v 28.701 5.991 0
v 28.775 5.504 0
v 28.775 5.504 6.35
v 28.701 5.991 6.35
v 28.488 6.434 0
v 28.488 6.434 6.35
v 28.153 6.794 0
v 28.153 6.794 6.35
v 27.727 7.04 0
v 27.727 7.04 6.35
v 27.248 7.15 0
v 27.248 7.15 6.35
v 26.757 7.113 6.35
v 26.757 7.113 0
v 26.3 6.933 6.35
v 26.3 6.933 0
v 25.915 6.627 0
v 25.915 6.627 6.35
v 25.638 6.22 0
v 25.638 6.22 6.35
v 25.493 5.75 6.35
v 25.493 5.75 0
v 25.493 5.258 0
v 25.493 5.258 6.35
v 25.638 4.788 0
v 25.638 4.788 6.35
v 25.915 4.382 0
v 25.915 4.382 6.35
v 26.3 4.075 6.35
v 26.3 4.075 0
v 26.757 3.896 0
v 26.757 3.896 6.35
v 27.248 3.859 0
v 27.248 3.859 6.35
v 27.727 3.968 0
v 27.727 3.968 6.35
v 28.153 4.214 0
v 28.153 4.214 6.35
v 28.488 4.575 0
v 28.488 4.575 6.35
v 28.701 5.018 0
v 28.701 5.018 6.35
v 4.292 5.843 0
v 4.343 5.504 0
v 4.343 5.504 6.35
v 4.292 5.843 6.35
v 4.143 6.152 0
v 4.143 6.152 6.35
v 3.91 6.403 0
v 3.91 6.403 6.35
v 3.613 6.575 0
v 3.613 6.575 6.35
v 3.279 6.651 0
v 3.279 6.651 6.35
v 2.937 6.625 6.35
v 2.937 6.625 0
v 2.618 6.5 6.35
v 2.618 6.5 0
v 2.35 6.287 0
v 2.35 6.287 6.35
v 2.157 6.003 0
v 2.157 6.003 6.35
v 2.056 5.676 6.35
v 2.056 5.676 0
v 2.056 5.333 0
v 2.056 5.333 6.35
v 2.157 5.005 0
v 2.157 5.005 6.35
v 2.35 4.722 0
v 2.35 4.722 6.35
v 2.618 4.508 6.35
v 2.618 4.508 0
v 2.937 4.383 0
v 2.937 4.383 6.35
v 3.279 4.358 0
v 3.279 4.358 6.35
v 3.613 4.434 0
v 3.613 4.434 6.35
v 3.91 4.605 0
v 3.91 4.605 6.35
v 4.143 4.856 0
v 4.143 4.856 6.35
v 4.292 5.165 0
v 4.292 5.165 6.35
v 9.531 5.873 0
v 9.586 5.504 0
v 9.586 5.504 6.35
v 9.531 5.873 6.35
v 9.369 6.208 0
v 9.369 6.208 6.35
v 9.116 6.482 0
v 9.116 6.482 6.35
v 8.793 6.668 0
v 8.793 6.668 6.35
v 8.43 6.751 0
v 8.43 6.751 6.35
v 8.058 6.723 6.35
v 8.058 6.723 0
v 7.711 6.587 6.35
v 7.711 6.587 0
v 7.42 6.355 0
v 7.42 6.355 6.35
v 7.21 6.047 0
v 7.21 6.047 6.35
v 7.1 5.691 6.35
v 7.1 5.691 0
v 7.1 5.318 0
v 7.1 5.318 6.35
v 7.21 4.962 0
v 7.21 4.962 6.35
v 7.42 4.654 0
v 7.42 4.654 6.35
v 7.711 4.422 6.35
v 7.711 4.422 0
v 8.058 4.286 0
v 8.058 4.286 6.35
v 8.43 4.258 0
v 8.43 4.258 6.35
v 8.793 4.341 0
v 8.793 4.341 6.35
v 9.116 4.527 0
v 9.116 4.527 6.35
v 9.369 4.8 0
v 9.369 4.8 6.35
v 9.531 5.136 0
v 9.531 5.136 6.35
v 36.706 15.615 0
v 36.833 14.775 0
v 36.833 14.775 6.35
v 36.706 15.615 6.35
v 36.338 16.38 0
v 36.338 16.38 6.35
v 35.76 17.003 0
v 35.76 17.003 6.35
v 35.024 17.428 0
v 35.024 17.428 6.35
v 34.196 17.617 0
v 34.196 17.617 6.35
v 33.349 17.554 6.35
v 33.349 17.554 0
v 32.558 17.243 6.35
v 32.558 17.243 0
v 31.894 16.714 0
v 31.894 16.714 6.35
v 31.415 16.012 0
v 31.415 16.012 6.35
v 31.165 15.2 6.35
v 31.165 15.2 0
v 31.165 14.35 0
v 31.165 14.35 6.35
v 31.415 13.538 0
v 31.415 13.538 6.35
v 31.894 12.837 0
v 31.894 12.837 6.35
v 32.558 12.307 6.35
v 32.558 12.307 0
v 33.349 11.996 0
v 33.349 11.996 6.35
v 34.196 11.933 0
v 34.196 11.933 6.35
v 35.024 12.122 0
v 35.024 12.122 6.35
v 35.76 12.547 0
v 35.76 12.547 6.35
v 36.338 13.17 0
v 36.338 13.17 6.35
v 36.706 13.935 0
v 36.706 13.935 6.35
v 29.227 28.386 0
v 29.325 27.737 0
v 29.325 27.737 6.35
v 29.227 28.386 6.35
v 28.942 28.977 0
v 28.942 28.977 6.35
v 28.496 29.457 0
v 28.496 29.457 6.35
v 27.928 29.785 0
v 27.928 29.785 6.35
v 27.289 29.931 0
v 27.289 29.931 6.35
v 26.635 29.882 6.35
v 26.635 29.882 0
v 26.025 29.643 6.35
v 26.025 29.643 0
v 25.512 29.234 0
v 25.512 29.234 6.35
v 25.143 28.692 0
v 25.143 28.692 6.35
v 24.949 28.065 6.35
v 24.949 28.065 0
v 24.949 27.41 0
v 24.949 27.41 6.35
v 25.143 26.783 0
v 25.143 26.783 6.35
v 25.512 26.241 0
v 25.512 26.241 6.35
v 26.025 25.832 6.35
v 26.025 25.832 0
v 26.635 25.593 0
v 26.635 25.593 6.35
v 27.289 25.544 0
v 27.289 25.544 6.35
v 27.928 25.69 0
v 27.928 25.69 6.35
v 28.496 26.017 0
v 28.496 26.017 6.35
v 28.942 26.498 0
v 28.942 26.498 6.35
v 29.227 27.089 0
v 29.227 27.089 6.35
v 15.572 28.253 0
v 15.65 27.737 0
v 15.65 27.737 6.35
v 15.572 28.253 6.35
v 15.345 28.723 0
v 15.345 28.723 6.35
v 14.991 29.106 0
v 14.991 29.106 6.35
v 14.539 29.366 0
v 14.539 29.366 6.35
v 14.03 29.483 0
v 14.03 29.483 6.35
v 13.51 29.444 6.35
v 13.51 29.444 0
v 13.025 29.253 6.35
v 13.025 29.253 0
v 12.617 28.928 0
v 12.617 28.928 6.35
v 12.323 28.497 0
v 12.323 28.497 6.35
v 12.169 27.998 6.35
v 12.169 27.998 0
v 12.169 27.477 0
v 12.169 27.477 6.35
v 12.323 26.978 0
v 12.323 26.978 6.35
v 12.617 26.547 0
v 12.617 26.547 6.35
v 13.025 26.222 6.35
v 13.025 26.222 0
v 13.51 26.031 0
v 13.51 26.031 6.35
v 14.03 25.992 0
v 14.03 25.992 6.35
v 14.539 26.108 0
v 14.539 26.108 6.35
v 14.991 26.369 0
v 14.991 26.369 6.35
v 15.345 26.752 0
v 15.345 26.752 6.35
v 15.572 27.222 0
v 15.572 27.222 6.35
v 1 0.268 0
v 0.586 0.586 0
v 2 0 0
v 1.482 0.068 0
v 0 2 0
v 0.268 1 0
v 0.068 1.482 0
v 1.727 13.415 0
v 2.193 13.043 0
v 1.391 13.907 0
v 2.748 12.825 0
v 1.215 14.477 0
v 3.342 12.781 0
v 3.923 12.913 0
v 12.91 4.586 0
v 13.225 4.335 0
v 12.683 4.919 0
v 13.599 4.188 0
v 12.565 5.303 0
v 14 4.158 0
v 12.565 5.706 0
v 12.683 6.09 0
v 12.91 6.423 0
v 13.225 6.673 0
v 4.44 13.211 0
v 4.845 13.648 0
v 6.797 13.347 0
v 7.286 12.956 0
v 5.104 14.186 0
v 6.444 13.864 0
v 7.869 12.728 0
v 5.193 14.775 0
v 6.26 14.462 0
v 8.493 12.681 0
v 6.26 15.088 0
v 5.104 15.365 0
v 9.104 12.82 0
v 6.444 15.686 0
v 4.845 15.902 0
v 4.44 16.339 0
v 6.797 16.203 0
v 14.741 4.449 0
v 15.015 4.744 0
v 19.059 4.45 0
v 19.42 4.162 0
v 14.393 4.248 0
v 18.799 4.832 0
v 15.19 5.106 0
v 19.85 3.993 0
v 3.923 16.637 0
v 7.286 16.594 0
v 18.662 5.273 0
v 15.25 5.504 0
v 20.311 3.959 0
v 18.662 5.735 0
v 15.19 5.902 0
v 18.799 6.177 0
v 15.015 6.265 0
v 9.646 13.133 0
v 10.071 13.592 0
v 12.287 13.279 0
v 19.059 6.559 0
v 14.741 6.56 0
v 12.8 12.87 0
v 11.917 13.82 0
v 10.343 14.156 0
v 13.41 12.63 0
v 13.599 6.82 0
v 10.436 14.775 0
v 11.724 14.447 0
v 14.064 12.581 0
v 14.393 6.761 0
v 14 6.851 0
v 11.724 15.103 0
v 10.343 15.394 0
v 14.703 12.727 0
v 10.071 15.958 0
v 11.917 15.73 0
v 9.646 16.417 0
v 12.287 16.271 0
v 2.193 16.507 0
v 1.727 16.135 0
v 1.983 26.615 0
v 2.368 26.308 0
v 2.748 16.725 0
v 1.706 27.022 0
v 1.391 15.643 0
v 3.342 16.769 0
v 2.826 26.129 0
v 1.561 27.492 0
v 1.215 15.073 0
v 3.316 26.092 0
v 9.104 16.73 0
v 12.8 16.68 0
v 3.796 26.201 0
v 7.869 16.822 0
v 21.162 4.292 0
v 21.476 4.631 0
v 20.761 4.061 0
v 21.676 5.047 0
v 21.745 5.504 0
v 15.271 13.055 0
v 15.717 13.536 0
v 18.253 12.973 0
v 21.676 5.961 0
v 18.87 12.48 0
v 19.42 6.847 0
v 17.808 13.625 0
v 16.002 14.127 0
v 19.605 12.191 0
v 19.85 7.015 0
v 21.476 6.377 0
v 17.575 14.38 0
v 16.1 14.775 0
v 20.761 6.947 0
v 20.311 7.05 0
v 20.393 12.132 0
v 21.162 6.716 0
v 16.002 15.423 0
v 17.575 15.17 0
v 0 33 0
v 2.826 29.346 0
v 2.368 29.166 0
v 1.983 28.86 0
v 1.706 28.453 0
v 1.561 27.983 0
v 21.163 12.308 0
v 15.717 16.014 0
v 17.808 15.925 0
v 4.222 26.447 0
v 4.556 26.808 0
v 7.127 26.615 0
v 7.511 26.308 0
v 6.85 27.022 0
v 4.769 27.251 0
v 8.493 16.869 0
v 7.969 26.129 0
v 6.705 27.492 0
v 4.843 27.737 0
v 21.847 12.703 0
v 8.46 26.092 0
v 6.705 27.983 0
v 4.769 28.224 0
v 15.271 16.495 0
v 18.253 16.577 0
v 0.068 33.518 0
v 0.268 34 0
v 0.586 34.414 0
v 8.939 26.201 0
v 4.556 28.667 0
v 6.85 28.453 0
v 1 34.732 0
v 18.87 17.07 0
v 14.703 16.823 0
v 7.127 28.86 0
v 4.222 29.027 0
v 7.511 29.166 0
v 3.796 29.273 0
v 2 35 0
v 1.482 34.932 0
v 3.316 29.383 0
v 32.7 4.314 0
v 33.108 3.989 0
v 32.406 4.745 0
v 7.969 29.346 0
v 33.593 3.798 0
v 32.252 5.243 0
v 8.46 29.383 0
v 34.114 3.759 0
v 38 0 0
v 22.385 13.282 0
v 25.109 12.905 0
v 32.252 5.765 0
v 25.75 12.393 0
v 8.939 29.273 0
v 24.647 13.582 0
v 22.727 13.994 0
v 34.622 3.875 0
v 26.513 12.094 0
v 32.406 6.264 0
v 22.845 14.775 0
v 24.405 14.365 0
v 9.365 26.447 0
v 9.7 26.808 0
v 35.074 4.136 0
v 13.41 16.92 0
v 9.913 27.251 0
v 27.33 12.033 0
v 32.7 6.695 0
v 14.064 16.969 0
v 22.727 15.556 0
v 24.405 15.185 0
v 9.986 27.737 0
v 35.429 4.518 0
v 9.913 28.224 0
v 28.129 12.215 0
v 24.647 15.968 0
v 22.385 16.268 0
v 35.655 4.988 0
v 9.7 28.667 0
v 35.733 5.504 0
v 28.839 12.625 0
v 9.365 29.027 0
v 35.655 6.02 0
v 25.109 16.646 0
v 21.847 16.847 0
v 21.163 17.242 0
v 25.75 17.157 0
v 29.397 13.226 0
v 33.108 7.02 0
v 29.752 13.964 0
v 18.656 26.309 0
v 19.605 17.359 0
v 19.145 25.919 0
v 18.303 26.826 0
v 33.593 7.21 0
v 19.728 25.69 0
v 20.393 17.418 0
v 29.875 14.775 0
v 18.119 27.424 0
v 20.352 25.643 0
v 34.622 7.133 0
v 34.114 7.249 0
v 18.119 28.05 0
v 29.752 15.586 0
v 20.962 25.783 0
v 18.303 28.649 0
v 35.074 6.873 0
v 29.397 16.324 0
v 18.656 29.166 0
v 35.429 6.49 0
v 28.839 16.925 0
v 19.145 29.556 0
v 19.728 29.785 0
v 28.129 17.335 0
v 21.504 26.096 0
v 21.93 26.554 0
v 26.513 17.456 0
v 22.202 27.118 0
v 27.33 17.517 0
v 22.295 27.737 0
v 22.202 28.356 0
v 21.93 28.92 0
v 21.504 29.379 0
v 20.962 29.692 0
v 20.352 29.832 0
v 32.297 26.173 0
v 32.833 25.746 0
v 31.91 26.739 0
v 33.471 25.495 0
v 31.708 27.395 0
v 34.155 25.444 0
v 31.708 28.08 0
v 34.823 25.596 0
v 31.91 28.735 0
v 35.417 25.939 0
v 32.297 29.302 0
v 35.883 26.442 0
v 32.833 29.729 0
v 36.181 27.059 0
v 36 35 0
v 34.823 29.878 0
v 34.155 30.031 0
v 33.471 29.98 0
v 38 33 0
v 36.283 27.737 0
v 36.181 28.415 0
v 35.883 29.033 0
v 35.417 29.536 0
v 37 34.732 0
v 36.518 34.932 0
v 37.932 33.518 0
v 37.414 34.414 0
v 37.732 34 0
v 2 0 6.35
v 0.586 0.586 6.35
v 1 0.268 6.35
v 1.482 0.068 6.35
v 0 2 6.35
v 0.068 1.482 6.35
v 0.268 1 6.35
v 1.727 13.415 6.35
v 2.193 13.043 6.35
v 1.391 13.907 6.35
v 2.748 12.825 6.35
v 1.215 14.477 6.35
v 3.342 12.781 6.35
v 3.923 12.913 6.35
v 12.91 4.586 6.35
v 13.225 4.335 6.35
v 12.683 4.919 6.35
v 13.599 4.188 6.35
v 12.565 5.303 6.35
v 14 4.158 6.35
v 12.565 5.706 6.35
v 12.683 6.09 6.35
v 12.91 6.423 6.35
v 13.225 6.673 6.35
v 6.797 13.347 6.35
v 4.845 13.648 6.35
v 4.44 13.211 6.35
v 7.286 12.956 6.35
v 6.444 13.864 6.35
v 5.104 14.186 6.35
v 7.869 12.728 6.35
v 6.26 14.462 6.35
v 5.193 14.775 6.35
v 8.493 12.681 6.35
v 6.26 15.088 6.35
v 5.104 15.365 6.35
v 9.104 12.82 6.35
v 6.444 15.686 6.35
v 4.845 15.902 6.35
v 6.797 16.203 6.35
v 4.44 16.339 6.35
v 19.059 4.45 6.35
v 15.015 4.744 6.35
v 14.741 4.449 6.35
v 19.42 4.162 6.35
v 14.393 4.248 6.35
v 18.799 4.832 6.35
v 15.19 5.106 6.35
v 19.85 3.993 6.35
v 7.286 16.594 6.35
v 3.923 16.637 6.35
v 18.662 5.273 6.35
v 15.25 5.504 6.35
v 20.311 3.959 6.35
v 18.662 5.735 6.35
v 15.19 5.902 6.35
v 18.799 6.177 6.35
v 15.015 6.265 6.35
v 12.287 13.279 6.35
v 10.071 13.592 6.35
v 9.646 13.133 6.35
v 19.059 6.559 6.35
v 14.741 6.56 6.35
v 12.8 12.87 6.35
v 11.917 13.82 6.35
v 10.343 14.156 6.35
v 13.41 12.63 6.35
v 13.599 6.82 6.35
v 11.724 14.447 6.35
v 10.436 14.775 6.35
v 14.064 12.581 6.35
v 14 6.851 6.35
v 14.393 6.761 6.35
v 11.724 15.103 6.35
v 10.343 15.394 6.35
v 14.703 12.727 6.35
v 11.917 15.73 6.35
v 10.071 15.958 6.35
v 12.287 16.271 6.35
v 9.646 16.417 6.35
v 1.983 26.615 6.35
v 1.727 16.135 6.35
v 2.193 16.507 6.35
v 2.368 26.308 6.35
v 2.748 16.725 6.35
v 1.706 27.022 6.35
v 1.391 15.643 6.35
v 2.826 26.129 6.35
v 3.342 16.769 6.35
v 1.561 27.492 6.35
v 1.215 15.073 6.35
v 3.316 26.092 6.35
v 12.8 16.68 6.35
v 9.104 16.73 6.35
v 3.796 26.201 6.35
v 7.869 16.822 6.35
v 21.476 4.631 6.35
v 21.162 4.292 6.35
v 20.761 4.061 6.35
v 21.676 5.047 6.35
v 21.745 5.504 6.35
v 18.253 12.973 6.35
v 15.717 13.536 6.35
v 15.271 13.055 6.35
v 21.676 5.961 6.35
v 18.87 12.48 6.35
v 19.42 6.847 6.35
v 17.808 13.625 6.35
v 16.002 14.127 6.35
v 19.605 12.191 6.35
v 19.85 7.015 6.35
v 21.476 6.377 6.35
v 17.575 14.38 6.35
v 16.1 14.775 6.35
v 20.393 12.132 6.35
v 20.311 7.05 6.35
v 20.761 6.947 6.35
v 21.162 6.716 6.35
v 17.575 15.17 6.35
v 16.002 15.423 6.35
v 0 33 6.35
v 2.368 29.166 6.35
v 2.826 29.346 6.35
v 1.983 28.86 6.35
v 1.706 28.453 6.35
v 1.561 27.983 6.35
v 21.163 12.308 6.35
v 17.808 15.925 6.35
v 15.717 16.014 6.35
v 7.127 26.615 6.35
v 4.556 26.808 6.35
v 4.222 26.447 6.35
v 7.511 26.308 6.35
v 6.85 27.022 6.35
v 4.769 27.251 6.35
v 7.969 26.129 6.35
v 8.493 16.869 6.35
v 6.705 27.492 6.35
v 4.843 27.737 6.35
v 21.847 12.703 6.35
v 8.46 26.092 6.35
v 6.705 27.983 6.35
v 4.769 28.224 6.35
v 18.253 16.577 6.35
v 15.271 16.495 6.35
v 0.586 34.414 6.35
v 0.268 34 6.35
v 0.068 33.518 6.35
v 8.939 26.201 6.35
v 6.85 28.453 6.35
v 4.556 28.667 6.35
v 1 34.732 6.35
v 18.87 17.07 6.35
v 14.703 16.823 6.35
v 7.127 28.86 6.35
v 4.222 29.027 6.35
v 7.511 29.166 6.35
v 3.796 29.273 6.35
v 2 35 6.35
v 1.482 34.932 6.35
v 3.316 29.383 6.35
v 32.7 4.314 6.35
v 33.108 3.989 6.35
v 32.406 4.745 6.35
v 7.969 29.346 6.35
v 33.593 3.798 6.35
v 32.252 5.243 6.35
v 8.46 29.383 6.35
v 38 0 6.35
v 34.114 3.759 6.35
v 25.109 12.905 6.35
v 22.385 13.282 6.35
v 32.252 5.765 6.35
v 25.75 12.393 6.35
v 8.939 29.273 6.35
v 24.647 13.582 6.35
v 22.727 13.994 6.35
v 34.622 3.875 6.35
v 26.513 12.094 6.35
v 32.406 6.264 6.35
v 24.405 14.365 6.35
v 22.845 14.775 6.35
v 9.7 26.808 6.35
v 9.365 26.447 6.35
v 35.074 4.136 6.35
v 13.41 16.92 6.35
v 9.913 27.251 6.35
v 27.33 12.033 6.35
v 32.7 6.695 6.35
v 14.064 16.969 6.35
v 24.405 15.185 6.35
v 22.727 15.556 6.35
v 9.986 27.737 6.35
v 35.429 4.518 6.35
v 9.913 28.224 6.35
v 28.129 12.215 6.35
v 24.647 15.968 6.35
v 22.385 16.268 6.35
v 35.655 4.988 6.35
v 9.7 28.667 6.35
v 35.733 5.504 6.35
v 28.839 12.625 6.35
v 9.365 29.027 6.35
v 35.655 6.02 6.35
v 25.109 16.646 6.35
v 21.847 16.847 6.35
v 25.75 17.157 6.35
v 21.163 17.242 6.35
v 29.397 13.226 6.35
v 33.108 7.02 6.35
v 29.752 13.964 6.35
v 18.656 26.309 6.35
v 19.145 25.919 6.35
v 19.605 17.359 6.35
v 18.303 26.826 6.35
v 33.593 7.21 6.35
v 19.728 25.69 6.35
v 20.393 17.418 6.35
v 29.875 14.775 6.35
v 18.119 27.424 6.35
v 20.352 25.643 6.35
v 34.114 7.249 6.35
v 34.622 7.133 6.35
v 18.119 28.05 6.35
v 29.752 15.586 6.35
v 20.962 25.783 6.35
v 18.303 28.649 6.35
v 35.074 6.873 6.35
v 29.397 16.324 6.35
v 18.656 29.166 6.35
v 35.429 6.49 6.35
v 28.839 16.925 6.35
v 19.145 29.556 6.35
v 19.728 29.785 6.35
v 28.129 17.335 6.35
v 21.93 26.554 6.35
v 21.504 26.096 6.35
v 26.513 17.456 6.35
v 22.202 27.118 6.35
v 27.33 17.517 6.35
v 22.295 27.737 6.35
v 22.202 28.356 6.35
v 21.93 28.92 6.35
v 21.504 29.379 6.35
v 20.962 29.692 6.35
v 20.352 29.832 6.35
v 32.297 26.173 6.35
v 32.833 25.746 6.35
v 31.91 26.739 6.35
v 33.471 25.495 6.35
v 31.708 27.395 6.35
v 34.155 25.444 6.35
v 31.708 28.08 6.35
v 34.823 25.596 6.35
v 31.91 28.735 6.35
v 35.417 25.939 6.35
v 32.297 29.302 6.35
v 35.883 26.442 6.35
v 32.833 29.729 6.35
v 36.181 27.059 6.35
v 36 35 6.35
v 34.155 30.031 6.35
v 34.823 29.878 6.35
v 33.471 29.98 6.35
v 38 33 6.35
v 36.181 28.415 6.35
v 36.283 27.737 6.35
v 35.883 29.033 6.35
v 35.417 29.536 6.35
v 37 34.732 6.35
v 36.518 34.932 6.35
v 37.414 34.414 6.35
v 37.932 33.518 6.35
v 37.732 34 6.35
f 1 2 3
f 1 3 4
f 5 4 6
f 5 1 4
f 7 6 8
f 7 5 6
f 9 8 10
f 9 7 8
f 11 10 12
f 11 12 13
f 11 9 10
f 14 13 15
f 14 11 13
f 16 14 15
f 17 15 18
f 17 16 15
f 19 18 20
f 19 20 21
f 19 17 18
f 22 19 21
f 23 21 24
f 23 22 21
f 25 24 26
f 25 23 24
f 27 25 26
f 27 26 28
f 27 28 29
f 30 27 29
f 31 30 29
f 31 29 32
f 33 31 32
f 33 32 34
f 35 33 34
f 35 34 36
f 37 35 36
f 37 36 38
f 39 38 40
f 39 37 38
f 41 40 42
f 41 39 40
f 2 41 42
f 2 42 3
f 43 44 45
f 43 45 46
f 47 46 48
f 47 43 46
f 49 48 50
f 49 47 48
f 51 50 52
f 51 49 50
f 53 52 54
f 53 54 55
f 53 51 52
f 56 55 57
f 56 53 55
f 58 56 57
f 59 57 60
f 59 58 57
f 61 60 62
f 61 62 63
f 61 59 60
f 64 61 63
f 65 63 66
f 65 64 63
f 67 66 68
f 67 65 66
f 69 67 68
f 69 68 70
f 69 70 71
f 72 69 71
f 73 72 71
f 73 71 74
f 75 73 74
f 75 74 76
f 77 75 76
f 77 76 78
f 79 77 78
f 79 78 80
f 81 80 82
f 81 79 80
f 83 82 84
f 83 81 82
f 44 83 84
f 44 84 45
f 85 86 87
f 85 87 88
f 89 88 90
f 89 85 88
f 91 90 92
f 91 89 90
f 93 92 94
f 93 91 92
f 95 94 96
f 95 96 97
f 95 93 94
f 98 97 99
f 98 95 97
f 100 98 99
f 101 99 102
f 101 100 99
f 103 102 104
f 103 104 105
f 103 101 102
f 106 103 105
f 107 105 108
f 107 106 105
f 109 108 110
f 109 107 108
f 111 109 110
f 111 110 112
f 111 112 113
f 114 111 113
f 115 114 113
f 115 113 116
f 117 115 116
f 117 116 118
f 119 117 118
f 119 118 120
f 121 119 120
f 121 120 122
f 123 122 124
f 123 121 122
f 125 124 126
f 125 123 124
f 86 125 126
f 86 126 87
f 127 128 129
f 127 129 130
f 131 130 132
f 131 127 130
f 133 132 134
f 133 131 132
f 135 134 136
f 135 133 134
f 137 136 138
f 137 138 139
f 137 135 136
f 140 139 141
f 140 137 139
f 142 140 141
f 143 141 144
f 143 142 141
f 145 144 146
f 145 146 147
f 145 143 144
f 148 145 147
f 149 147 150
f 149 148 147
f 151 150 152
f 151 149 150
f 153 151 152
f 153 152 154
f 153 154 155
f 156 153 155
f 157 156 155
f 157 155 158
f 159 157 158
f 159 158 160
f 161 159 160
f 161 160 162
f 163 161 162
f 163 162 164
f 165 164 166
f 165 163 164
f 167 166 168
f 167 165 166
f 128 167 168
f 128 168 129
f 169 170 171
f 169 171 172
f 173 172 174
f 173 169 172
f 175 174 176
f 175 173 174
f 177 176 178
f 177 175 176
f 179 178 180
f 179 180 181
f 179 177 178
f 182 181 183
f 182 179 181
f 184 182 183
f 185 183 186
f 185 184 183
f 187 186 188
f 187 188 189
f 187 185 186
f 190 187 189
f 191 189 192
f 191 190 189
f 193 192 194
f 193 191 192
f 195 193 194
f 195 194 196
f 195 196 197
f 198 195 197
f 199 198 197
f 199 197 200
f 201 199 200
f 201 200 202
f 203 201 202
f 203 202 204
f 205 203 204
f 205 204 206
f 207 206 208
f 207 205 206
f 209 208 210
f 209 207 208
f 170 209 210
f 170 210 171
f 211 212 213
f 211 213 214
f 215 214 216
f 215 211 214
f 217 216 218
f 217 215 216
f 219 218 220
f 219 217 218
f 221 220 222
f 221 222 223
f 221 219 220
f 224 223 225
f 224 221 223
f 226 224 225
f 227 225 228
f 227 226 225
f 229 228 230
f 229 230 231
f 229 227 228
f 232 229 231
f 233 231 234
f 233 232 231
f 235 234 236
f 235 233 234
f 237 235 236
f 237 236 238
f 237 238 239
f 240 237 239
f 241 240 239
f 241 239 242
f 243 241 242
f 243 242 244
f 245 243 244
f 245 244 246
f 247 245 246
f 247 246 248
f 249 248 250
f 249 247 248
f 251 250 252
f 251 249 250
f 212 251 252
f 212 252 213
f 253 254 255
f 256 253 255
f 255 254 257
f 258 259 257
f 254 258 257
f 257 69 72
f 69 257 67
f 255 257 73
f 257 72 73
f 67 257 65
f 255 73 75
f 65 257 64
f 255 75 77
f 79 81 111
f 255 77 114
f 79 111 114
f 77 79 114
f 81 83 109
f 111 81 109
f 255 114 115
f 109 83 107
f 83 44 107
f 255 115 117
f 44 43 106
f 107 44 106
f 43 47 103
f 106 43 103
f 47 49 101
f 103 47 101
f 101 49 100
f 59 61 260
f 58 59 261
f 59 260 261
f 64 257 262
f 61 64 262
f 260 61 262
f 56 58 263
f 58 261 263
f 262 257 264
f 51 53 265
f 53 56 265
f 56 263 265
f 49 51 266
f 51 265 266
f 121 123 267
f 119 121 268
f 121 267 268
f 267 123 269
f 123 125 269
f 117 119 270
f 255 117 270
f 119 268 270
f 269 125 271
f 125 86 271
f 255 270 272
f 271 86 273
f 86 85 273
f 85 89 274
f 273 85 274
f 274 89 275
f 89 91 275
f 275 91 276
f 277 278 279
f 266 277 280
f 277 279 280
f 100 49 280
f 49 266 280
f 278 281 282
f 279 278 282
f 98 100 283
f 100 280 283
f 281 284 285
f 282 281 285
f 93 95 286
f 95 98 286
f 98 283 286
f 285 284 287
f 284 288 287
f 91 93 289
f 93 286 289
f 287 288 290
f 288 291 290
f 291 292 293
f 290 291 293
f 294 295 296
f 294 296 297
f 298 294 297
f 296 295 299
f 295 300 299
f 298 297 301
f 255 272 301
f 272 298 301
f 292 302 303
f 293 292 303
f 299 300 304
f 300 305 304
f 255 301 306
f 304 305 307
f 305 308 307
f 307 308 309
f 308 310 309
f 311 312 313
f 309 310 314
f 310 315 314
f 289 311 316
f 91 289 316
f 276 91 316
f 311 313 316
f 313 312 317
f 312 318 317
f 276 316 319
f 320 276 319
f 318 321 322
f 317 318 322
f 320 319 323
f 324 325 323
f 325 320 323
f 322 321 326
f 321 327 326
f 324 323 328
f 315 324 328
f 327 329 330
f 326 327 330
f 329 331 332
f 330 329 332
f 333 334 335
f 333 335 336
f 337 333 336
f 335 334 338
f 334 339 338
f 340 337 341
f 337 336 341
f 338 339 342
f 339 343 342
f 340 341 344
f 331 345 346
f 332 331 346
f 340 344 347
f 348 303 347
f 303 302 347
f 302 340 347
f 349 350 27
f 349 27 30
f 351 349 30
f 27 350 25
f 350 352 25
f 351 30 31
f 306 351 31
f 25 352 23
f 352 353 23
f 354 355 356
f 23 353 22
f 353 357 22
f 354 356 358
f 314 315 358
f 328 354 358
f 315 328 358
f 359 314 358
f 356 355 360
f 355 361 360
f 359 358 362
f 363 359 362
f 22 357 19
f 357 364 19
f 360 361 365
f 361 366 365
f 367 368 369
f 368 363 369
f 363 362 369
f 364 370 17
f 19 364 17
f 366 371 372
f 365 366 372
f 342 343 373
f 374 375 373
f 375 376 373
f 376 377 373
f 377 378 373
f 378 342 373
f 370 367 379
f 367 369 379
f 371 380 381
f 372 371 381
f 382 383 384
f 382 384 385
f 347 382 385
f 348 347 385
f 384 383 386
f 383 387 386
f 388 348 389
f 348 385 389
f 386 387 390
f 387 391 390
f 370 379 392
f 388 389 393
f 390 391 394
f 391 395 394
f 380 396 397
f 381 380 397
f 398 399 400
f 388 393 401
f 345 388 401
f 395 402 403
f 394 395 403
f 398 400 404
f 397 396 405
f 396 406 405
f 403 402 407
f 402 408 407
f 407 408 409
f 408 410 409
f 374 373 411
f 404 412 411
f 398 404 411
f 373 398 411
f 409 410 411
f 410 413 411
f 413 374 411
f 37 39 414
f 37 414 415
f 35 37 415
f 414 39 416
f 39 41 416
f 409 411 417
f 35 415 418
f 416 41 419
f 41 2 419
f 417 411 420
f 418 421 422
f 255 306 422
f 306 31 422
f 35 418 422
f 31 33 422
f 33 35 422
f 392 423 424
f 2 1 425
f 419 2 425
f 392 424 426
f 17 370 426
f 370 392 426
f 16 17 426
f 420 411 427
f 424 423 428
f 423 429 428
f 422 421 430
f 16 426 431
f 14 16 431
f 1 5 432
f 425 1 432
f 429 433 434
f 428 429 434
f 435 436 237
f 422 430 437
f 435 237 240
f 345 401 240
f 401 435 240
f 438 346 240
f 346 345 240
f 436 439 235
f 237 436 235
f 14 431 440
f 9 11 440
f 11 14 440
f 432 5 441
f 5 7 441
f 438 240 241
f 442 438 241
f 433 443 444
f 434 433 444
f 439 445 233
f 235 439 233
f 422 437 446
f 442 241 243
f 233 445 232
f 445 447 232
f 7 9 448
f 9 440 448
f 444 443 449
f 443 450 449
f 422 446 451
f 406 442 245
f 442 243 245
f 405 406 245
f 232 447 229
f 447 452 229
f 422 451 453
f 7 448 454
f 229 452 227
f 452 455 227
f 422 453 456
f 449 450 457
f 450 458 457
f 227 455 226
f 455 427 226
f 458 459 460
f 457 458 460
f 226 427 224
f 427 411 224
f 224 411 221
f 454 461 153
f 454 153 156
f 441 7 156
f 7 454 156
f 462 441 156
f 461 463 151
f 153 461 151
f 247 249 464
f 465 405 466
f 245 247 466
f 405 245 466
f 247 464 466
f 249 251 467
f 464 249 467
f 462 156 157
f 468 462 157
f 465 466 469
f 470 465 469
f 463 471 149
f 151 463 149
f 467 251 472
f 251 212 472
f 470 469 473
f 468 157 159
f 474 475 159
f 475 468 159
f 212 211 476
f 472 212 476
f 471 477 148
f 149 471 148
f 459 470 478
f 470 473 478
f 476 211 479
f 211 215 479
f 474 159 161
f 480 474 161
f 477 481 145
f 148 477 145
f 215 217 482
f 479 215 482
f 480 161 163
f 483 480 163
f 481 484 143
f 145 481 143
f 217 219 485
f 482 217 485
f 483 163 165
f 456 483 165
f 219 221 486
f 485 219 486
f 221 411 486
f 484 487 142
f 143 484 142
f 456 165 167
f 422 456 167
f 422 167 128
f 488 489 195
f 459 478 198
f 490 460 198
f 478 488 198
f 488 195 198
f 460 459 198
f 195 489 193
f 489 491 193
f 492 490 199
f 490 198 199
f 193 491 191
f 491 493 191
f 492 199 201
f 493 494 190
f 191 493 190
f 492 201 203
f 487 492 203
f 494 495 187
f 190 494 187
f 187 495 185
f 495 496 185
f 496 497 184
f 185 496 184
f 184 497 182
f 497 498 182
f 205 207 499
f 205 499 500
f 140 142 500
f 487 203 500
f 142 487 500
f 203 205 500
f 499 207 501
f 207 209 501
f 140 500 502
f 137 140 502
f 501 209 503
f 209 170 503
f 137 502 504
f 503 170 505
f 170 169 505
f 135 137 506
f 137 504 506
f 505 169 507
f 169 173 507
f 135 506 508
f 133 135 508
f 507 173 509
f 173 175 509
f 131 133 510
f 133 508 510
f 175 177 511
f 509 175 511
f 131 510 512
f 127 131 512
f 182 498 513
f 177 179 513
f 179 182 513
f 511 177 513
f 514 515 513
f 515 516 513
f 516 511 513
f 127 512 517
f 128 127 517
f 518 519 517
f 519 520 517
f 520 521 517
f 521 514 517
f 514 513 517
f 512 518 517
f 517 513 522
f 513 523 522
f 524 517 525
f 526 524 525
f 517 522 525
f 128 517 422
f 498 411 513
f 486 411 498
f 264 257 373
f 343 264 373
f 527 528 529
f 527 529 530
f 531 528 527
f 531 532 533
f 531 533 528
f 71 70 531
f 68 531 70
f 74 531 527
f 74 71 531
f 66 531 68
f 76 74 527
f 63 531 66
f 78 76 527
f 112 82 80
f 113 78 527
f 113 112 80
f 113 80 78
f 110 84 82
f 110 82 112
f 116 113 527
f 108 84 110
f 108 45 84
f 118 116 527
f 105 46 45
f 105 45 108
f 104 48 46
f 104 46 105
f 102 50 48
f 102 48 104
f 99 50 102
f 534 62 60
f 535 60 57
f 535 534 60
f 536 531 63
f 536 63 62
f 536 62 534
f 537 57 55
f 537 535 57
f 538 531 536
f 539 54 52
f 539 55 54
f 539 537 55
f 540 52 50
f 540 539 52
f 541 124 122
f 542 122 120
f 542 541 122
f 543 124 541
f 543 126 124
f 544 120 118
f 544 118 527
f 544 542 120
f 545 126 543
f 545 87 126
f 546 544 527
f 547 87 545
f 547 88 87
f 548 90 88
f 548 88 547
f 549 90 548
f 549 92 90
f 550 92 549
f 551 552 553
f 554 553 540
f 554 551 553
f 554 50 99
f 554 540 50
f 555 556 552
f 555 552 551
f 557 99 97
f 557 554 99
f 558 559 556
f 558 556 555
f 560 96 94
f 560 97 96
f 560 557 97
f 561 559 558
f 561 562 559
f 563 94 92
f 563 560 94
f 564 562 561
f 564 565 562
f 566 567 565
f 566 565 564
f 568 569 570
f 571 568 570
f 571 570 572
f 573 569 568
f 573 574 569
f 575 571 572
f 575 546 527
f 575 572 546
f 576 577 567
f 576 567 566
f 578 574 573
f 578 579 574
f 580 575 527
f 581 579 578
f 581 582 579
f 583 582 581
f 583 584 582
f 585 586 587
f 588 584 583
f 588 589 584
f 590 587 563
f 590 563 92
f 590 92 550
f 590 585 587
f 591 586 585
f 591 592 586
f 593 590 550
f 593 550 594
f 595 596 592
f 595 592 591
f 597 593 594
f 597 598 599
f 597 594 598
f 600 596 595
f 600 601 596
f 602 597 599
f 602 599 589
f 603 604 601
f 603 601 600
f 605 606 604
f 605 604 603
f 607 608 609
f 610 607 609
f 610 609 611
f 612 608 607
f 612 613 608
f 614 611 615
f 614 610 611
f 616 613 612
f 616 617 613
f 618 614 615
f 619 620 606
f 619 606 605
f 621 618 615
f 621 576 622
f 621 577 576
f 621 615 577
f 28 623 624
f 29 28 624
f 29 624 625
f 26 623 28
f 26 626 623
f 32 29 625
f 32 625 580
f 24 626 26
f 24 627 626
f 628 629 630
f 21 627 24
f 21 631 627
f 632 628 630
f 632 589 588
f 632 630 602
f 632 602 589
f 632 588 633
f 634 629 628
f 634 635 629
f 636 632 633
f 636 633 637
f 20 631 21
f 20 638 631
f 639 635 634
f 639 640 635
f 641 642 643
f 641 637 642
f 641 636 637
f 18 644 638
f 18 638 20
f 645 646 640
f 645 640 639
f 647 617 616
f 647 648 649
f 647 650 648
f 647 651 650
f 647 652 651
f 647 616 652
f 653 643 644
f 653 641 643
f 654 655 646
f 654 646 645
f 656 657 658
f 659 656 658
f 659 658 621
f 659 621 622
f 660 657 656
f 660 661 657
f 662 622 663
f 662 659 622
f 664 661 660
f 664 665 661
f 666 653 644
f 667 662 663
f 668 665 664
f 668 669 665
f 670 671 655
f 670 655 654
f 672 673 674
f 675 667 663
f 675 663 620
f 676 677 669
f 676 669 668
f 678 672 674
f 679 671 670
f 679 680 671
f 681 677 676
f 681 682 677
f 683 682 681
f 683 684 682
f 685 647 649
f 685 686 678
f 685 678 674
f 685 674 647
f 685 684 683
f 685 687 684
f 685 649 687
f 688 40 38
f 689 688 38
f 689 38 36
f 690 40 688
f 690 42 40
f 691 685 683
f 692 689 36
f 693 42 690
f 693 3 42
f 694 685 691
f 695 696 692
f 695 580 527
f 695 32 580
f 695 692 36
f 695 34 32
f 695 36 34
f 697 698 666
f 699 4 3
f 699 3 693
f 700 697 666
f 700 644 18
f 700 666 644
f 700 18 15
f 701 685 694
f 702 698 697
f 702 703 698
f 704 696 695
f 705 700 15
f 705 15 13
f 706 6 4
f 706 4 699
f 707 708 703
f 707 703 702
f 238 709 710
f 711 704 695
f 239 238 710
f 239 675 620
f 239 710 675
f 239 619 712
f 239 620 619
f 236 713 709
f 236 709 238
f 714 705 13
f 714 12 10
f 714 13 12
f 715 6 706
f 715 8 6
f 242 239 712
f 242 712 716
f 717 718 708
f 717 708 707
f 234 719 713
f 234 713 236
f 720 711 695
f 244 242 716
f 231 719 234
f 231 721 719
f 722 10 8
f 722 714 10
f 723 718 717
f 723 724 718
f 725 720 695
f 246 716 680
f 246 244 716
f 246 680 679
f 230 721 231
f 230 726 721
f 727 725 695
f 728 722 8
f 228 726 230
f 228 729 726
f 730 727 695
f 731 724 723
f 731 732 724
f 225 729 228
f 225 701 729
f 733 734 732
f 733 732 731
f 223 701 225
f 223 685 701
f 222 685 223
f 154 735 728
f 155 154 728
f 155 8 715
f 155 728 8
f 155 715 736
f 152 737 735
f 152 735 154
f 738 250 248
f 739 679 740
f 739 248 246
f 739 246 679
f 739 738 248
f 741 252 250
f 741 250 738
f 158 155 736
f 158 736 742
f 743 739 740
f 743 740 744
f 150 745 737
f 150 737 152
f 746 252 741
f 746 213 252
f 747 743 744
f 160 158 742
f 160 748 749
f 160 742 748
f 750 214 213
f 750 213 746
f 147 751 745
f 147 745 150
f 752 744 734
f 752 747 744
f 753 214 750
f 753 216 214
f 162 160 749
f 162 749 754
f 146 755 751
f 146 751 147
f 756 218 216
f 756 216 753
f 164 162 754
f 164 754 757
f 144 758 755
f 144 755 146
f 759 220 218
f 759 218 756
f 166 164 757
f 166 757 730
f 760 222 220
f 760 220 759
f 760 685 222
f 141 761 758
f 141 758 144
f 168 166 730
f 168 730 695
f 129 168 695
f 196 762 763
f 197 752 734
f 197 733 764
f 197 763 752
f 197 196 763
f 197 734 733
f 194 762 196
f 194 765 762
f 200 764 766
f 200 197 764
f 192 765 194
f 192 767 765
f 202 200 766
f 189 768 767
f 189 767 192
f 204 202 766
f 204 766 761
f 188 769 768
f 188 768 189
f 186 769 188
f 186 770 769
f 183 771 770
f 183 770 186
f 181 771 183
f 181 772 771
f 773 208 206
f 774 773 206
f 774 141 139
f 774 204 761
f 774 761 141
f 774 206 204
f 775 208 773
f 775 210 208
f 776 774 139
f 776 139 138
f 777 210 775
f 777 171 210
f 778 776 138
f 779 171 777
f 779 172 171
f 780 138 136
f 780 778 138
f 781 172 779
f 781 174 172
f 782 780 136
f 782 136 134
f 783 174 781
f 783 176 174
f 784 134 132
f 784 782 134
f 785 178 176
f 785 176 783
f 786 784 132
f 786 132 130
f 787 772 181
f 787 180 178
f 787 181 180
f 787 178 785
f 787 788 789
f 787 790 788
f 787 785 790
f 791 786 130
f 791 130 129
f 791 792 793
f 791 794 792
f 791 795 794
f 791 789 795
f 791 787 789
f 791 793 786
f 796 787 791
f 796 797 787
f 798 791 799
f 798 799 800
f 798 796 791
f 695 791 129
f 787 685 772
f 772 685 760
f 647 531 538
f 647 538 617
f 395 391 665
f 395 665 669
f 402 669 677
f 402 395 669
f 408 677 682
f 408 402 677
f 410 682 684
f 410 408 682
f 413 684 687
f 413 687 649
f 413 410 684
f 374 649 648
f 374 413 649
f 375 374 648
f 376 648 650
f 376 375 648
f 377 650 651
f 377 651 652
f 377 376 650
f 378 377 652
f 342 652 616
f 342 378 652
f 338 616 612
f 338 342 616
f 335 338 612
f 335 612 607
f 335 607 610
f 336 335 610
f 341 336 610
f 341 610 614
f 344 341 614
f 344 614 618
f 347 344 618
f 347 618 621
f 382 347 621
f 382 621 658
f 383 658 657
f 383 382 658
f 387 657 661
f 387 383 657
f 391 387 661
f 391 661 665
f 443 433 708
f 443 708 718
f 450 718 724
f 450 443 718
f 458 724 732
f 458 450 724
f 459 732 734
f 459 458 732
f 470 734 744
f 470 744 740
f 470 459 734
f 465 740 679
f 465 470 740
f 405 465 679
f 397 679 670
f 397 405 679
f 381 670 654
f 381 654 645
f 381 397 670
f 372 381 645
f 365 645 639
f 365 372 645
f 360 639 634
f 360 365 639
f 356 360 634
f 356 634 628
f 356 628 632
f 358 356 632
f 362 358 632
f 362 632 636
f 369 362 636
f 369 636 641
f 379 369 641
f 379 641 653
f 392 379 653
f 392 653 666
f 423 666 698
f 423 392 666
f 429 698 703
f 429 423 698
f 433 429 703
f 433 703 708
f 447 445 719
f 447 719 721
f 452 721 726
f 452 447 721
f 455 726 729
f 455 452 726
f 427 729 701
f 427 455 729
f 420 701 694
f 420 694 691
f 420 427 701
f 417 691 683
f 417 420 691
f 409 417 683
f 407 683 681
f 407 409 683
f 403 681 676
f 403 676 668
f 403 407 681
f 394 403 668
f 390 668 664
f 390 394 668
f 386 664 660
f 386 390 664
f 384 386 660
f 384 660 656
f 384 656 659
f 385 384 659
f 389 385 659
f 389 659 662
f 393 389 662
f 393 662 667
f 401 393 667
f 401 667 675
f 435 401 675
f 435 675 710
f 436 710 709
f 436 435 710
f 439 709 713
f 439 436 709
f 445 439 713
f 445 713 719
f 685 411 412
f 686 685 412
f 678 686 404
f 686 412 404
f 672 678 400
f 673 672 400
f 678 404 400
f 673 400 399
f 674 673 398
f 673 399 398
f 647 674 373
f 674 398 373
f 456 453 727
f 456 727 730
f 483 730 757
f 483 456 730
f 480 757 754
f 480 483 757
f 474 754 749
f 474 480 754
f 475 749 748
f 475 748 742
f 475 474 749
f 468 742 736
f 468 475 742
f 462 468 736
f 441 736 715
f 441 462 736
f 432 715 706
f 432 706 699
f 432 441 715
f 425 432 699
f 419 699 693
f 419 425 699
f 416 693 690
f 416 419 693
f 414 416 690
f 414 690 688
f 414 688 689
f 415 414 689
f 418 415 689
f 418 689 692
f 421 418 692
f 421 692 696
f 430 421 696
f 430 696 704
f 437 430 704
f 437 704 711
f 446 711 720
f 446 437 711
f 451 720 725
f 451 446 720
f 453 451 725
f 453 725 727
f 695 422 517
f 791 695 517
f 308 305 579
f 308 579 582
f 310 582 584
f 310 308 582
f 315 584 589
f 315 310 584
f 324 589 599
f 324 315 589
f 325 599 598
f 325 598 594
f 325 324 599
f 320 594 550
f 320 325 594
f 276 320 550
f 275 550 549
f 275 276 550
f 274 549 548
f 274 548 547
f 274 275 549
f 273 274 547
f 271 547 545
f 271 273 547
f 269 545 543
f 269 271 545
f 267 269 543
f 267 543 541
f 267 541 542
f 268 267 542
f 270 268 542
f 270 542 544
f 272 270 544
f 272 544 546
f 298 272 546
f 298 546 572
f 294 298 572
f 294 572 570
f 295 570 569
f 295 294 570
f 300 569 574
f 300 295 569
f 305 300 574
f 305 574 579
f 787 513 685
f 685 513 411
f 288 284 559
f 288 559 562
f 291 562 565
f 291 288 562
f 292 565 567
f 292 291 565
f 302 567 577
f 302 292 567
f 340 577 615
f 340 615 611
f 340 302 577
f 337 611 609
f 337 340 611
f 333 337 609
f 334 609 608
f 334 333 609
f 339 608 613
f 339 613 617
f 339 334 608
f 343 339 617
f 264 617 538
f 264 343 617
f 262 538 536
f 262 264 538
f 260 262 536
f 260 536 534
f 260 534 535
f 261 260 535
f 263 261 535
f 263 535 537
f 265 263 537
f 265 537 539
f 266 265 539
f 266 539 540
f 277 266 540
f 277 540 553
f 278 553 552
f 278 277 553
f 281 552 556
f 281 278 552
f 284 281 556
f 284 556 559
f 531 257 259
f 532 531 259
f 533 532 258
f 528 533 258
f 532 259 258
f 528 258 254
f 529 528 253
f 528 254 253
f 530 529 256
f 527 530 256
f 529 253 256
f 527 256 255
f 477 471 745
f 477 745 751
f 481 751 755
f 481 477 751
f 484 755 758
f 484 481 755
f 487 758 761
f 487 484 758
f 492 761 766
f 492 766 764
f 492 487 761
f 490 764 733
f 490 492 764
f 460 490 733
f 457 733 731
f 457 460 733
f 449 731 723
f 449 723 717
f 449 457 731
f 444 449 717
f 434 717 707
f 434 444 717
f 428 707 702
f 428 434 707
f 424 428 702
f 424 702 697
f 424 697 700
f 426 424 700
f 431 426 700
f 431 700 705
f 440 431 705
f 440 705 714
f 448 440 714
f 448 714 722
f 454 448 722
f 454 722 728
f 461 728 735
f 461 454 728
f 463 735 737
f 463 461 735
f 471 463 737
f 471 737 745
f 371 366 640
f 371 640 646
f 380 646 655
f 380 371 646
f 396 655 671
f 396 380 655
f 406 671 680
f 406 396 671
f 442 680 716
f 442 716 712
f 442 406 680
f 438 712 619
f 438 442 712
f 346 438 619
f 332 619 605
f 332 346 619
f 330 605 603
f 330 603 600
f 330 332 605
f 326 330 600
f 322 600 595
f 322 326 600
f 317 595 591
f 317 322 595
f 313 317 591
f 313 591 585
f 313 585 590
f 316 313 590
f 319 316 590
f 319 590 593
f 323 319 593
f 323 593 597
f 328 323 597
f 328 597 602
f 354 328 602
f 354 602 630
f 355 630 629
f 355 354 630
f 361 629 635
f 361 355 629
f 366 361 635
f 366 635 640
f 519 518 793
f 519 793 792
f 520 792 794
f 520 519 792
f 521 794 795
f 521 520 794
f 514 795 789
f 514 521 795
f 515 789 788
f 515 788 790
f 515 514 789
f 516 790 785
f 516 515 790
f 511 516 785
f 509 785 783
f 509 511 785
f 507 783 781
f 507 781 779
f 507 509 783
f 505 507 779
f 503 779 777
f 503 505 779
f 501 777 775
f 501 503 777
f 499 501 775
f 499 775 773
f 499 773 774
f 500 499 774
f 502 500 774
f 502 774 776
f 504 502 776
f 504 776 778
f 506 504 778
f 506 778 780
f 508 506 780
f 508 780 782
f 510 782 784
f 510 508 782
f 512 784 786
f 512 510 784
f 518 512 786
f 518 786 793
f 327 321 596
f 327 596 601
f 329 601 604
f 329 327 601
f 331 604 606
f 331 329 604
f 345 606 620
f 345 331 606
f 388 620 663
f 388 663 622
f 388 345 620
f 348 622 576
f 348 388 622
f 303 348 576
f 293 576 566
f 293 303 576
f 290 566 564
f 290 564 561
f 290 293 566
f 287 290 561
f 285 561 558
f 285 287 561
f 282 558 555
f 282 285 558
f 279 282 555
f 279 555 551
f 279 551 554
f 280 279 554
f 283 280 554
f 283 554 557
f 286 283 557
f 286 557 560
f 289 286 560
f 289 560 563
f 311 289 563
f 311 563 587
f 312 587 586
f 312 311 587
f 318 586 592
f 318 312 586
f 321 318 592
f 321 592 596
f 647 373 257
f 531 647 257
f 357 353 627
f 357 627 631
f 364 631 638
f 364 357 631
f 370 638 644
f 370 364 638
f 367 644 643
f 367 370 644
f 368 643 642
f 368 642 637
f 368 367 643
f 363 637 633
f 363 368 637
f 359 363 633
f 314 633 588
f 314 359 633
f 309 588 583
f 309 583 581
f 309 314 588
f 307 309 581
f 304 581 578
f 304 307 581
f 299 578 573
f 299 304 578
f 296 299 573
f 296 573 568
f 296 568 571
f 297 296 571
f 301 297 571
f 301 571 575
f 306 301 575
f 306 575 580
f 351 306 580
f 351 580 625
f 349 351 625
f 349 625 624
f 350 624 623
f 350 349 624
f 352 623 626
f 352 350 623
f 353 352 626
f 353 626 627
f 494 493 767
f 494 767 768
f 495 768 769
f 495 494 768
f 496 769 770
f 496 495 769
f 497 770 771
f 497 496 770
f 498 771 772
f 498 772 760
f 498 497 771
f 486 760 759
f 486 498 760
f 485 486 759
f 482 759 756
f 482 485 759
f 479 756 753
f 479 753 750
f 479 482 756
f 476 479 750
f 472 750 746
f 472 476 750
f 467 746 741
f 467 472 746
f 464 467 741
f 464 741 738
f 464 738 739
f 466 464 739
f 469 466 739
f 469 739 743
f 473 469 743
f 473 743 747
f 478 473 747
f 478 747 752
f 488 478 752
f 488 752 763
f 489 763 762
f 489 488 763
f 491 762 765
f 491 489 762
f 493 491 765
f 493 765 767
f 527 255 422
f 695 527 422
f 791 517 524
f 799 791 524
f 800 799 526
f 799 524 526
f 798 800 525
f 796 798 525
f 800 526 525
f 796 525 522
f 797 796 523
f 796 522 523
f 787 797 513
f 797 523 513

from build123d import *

# Parameters (mm, degrees)
SKETCH1_R           = 1.65
SKETCH1_R_2         = 2.2
SKETCH1_R_3         = 2.1
SKETCH1_R_4         = 2.75
SKETCH1_R_5         = 1.75
SKETCH1_R_6         = 2.3
SKETCH1_R_7         = 2.85
SKETCH1_R_8         = 2.65
SKETCH1_R_9         = 2
SKETCH1_R_10        = 1.25
SKETCH1_R_11        = 1.35
SKETCH1_R_12        = 1.55
SKETCH1_R_13        = 1.15
BOSS_EXTRUDE1_DEPTH = 6.35


with BuildPart() as part:
    # Sketch1 → Boss-Extrude1 (new body)
    with BuildSketch(Plane.XY):
        with BuildLine():
            Line((2, 0), (38, 0))
            Line((38, 0), (38, 33))
            ThreePointArc((38, 33), (37.414213562, 34.414213562), (36, 35))
            Line((36, 35), (2, 35))
            ThreePointArc((2, 35), (0.585786438, 34.414213562), (0, 33))
            Line((0, 33), (0, 2))
            ThreePointArc((0, 2), (0.585786438, 0.585786438), (2, 0))
        make_face()
        with Locations((8.336360719, 27.737428386)):
            Circle(SKETCH1_R, mode=Mode.SUBTRACT)
        with Locations((27.124645172, 27.737428386)):
            Circle(SKETCH1_R_2, mode=Mode.SUBTRACT)
        with Locations((8.336360719, 14.775034728)):
            Circle(SKETCH1_R_3, mode=Mode.SUBTRACT)
        with Locations((27.124645172, 14.775034728)):
            Circle(SKETCH1_R_4, mode=Mode.SUBTRACT)
        with Locations((13.899554089, 27.737428386)):
            Circle(SKETCH1_R_5, mode=Mode.SUBTRACT)
        with Locations((33.982726189, 27.737428386)):
            Circle(SKETCH1_R_6, mode=Mode.SUBTRACT)
        with Locations((20.195125811, 27.737428386)):
            Circle(SKETCH1_R_3, mode=Mode.SUBTRACT)
        with Locations((3.192799956, 27.737428386)):
            Circle(SKETCH1_R, mode=Mode.SUBTRACT)
        with Locations((33.982726189, 14.775034728)):
            Circle(SKETCH1_R_7, mode=Mode.SUBTRACT)
        with Locations((20.195125811, 14.775034728)):
            Circle(SKETCH1_R_8, mode=Mode.SUBTRACT)
        with Locations((3.192799956, 14.775034728)):
            Circle(SKETCH1_R_9, mode=Mode.SUBTRACT)
        with Locations((13.899554089, 14.775034728)):
            Circle(SKETCH1_R_2, mode=Mode.SUBTRACT)
        with Locations((8.336360719, 5.504307148)):
            Circle(SKETCH1_R_10, mode=Mode.SUBTRACT)
        with Locations((27.124645172, 5.504307148)):
            Circle(SKETCH1_R, mode=Mode.SUBTRACT)
        with Locations((13.899554089, 5.504307148)):
            Circle(SKETCH1_R_11, mode=Mode.SUBTRACT)
        with Locations((33.982726189, 5.504307148)):
            Circle(SKETCH1_R_5, mode=Mode.SUBTRACT)
        with Locations((20.195125811, 5.504307148)):
            Circle(SKETCH1_R_12, mode=Mode.SUBTRACT)
        with Locations((3.192799956, 5.504307148)):
            Circle(SKETCH1_R_13, mode=Mode.SUBTRACT)
    extrude(amount=BOSS_EXTRUDE1_DEPTH)


solid = part.part
